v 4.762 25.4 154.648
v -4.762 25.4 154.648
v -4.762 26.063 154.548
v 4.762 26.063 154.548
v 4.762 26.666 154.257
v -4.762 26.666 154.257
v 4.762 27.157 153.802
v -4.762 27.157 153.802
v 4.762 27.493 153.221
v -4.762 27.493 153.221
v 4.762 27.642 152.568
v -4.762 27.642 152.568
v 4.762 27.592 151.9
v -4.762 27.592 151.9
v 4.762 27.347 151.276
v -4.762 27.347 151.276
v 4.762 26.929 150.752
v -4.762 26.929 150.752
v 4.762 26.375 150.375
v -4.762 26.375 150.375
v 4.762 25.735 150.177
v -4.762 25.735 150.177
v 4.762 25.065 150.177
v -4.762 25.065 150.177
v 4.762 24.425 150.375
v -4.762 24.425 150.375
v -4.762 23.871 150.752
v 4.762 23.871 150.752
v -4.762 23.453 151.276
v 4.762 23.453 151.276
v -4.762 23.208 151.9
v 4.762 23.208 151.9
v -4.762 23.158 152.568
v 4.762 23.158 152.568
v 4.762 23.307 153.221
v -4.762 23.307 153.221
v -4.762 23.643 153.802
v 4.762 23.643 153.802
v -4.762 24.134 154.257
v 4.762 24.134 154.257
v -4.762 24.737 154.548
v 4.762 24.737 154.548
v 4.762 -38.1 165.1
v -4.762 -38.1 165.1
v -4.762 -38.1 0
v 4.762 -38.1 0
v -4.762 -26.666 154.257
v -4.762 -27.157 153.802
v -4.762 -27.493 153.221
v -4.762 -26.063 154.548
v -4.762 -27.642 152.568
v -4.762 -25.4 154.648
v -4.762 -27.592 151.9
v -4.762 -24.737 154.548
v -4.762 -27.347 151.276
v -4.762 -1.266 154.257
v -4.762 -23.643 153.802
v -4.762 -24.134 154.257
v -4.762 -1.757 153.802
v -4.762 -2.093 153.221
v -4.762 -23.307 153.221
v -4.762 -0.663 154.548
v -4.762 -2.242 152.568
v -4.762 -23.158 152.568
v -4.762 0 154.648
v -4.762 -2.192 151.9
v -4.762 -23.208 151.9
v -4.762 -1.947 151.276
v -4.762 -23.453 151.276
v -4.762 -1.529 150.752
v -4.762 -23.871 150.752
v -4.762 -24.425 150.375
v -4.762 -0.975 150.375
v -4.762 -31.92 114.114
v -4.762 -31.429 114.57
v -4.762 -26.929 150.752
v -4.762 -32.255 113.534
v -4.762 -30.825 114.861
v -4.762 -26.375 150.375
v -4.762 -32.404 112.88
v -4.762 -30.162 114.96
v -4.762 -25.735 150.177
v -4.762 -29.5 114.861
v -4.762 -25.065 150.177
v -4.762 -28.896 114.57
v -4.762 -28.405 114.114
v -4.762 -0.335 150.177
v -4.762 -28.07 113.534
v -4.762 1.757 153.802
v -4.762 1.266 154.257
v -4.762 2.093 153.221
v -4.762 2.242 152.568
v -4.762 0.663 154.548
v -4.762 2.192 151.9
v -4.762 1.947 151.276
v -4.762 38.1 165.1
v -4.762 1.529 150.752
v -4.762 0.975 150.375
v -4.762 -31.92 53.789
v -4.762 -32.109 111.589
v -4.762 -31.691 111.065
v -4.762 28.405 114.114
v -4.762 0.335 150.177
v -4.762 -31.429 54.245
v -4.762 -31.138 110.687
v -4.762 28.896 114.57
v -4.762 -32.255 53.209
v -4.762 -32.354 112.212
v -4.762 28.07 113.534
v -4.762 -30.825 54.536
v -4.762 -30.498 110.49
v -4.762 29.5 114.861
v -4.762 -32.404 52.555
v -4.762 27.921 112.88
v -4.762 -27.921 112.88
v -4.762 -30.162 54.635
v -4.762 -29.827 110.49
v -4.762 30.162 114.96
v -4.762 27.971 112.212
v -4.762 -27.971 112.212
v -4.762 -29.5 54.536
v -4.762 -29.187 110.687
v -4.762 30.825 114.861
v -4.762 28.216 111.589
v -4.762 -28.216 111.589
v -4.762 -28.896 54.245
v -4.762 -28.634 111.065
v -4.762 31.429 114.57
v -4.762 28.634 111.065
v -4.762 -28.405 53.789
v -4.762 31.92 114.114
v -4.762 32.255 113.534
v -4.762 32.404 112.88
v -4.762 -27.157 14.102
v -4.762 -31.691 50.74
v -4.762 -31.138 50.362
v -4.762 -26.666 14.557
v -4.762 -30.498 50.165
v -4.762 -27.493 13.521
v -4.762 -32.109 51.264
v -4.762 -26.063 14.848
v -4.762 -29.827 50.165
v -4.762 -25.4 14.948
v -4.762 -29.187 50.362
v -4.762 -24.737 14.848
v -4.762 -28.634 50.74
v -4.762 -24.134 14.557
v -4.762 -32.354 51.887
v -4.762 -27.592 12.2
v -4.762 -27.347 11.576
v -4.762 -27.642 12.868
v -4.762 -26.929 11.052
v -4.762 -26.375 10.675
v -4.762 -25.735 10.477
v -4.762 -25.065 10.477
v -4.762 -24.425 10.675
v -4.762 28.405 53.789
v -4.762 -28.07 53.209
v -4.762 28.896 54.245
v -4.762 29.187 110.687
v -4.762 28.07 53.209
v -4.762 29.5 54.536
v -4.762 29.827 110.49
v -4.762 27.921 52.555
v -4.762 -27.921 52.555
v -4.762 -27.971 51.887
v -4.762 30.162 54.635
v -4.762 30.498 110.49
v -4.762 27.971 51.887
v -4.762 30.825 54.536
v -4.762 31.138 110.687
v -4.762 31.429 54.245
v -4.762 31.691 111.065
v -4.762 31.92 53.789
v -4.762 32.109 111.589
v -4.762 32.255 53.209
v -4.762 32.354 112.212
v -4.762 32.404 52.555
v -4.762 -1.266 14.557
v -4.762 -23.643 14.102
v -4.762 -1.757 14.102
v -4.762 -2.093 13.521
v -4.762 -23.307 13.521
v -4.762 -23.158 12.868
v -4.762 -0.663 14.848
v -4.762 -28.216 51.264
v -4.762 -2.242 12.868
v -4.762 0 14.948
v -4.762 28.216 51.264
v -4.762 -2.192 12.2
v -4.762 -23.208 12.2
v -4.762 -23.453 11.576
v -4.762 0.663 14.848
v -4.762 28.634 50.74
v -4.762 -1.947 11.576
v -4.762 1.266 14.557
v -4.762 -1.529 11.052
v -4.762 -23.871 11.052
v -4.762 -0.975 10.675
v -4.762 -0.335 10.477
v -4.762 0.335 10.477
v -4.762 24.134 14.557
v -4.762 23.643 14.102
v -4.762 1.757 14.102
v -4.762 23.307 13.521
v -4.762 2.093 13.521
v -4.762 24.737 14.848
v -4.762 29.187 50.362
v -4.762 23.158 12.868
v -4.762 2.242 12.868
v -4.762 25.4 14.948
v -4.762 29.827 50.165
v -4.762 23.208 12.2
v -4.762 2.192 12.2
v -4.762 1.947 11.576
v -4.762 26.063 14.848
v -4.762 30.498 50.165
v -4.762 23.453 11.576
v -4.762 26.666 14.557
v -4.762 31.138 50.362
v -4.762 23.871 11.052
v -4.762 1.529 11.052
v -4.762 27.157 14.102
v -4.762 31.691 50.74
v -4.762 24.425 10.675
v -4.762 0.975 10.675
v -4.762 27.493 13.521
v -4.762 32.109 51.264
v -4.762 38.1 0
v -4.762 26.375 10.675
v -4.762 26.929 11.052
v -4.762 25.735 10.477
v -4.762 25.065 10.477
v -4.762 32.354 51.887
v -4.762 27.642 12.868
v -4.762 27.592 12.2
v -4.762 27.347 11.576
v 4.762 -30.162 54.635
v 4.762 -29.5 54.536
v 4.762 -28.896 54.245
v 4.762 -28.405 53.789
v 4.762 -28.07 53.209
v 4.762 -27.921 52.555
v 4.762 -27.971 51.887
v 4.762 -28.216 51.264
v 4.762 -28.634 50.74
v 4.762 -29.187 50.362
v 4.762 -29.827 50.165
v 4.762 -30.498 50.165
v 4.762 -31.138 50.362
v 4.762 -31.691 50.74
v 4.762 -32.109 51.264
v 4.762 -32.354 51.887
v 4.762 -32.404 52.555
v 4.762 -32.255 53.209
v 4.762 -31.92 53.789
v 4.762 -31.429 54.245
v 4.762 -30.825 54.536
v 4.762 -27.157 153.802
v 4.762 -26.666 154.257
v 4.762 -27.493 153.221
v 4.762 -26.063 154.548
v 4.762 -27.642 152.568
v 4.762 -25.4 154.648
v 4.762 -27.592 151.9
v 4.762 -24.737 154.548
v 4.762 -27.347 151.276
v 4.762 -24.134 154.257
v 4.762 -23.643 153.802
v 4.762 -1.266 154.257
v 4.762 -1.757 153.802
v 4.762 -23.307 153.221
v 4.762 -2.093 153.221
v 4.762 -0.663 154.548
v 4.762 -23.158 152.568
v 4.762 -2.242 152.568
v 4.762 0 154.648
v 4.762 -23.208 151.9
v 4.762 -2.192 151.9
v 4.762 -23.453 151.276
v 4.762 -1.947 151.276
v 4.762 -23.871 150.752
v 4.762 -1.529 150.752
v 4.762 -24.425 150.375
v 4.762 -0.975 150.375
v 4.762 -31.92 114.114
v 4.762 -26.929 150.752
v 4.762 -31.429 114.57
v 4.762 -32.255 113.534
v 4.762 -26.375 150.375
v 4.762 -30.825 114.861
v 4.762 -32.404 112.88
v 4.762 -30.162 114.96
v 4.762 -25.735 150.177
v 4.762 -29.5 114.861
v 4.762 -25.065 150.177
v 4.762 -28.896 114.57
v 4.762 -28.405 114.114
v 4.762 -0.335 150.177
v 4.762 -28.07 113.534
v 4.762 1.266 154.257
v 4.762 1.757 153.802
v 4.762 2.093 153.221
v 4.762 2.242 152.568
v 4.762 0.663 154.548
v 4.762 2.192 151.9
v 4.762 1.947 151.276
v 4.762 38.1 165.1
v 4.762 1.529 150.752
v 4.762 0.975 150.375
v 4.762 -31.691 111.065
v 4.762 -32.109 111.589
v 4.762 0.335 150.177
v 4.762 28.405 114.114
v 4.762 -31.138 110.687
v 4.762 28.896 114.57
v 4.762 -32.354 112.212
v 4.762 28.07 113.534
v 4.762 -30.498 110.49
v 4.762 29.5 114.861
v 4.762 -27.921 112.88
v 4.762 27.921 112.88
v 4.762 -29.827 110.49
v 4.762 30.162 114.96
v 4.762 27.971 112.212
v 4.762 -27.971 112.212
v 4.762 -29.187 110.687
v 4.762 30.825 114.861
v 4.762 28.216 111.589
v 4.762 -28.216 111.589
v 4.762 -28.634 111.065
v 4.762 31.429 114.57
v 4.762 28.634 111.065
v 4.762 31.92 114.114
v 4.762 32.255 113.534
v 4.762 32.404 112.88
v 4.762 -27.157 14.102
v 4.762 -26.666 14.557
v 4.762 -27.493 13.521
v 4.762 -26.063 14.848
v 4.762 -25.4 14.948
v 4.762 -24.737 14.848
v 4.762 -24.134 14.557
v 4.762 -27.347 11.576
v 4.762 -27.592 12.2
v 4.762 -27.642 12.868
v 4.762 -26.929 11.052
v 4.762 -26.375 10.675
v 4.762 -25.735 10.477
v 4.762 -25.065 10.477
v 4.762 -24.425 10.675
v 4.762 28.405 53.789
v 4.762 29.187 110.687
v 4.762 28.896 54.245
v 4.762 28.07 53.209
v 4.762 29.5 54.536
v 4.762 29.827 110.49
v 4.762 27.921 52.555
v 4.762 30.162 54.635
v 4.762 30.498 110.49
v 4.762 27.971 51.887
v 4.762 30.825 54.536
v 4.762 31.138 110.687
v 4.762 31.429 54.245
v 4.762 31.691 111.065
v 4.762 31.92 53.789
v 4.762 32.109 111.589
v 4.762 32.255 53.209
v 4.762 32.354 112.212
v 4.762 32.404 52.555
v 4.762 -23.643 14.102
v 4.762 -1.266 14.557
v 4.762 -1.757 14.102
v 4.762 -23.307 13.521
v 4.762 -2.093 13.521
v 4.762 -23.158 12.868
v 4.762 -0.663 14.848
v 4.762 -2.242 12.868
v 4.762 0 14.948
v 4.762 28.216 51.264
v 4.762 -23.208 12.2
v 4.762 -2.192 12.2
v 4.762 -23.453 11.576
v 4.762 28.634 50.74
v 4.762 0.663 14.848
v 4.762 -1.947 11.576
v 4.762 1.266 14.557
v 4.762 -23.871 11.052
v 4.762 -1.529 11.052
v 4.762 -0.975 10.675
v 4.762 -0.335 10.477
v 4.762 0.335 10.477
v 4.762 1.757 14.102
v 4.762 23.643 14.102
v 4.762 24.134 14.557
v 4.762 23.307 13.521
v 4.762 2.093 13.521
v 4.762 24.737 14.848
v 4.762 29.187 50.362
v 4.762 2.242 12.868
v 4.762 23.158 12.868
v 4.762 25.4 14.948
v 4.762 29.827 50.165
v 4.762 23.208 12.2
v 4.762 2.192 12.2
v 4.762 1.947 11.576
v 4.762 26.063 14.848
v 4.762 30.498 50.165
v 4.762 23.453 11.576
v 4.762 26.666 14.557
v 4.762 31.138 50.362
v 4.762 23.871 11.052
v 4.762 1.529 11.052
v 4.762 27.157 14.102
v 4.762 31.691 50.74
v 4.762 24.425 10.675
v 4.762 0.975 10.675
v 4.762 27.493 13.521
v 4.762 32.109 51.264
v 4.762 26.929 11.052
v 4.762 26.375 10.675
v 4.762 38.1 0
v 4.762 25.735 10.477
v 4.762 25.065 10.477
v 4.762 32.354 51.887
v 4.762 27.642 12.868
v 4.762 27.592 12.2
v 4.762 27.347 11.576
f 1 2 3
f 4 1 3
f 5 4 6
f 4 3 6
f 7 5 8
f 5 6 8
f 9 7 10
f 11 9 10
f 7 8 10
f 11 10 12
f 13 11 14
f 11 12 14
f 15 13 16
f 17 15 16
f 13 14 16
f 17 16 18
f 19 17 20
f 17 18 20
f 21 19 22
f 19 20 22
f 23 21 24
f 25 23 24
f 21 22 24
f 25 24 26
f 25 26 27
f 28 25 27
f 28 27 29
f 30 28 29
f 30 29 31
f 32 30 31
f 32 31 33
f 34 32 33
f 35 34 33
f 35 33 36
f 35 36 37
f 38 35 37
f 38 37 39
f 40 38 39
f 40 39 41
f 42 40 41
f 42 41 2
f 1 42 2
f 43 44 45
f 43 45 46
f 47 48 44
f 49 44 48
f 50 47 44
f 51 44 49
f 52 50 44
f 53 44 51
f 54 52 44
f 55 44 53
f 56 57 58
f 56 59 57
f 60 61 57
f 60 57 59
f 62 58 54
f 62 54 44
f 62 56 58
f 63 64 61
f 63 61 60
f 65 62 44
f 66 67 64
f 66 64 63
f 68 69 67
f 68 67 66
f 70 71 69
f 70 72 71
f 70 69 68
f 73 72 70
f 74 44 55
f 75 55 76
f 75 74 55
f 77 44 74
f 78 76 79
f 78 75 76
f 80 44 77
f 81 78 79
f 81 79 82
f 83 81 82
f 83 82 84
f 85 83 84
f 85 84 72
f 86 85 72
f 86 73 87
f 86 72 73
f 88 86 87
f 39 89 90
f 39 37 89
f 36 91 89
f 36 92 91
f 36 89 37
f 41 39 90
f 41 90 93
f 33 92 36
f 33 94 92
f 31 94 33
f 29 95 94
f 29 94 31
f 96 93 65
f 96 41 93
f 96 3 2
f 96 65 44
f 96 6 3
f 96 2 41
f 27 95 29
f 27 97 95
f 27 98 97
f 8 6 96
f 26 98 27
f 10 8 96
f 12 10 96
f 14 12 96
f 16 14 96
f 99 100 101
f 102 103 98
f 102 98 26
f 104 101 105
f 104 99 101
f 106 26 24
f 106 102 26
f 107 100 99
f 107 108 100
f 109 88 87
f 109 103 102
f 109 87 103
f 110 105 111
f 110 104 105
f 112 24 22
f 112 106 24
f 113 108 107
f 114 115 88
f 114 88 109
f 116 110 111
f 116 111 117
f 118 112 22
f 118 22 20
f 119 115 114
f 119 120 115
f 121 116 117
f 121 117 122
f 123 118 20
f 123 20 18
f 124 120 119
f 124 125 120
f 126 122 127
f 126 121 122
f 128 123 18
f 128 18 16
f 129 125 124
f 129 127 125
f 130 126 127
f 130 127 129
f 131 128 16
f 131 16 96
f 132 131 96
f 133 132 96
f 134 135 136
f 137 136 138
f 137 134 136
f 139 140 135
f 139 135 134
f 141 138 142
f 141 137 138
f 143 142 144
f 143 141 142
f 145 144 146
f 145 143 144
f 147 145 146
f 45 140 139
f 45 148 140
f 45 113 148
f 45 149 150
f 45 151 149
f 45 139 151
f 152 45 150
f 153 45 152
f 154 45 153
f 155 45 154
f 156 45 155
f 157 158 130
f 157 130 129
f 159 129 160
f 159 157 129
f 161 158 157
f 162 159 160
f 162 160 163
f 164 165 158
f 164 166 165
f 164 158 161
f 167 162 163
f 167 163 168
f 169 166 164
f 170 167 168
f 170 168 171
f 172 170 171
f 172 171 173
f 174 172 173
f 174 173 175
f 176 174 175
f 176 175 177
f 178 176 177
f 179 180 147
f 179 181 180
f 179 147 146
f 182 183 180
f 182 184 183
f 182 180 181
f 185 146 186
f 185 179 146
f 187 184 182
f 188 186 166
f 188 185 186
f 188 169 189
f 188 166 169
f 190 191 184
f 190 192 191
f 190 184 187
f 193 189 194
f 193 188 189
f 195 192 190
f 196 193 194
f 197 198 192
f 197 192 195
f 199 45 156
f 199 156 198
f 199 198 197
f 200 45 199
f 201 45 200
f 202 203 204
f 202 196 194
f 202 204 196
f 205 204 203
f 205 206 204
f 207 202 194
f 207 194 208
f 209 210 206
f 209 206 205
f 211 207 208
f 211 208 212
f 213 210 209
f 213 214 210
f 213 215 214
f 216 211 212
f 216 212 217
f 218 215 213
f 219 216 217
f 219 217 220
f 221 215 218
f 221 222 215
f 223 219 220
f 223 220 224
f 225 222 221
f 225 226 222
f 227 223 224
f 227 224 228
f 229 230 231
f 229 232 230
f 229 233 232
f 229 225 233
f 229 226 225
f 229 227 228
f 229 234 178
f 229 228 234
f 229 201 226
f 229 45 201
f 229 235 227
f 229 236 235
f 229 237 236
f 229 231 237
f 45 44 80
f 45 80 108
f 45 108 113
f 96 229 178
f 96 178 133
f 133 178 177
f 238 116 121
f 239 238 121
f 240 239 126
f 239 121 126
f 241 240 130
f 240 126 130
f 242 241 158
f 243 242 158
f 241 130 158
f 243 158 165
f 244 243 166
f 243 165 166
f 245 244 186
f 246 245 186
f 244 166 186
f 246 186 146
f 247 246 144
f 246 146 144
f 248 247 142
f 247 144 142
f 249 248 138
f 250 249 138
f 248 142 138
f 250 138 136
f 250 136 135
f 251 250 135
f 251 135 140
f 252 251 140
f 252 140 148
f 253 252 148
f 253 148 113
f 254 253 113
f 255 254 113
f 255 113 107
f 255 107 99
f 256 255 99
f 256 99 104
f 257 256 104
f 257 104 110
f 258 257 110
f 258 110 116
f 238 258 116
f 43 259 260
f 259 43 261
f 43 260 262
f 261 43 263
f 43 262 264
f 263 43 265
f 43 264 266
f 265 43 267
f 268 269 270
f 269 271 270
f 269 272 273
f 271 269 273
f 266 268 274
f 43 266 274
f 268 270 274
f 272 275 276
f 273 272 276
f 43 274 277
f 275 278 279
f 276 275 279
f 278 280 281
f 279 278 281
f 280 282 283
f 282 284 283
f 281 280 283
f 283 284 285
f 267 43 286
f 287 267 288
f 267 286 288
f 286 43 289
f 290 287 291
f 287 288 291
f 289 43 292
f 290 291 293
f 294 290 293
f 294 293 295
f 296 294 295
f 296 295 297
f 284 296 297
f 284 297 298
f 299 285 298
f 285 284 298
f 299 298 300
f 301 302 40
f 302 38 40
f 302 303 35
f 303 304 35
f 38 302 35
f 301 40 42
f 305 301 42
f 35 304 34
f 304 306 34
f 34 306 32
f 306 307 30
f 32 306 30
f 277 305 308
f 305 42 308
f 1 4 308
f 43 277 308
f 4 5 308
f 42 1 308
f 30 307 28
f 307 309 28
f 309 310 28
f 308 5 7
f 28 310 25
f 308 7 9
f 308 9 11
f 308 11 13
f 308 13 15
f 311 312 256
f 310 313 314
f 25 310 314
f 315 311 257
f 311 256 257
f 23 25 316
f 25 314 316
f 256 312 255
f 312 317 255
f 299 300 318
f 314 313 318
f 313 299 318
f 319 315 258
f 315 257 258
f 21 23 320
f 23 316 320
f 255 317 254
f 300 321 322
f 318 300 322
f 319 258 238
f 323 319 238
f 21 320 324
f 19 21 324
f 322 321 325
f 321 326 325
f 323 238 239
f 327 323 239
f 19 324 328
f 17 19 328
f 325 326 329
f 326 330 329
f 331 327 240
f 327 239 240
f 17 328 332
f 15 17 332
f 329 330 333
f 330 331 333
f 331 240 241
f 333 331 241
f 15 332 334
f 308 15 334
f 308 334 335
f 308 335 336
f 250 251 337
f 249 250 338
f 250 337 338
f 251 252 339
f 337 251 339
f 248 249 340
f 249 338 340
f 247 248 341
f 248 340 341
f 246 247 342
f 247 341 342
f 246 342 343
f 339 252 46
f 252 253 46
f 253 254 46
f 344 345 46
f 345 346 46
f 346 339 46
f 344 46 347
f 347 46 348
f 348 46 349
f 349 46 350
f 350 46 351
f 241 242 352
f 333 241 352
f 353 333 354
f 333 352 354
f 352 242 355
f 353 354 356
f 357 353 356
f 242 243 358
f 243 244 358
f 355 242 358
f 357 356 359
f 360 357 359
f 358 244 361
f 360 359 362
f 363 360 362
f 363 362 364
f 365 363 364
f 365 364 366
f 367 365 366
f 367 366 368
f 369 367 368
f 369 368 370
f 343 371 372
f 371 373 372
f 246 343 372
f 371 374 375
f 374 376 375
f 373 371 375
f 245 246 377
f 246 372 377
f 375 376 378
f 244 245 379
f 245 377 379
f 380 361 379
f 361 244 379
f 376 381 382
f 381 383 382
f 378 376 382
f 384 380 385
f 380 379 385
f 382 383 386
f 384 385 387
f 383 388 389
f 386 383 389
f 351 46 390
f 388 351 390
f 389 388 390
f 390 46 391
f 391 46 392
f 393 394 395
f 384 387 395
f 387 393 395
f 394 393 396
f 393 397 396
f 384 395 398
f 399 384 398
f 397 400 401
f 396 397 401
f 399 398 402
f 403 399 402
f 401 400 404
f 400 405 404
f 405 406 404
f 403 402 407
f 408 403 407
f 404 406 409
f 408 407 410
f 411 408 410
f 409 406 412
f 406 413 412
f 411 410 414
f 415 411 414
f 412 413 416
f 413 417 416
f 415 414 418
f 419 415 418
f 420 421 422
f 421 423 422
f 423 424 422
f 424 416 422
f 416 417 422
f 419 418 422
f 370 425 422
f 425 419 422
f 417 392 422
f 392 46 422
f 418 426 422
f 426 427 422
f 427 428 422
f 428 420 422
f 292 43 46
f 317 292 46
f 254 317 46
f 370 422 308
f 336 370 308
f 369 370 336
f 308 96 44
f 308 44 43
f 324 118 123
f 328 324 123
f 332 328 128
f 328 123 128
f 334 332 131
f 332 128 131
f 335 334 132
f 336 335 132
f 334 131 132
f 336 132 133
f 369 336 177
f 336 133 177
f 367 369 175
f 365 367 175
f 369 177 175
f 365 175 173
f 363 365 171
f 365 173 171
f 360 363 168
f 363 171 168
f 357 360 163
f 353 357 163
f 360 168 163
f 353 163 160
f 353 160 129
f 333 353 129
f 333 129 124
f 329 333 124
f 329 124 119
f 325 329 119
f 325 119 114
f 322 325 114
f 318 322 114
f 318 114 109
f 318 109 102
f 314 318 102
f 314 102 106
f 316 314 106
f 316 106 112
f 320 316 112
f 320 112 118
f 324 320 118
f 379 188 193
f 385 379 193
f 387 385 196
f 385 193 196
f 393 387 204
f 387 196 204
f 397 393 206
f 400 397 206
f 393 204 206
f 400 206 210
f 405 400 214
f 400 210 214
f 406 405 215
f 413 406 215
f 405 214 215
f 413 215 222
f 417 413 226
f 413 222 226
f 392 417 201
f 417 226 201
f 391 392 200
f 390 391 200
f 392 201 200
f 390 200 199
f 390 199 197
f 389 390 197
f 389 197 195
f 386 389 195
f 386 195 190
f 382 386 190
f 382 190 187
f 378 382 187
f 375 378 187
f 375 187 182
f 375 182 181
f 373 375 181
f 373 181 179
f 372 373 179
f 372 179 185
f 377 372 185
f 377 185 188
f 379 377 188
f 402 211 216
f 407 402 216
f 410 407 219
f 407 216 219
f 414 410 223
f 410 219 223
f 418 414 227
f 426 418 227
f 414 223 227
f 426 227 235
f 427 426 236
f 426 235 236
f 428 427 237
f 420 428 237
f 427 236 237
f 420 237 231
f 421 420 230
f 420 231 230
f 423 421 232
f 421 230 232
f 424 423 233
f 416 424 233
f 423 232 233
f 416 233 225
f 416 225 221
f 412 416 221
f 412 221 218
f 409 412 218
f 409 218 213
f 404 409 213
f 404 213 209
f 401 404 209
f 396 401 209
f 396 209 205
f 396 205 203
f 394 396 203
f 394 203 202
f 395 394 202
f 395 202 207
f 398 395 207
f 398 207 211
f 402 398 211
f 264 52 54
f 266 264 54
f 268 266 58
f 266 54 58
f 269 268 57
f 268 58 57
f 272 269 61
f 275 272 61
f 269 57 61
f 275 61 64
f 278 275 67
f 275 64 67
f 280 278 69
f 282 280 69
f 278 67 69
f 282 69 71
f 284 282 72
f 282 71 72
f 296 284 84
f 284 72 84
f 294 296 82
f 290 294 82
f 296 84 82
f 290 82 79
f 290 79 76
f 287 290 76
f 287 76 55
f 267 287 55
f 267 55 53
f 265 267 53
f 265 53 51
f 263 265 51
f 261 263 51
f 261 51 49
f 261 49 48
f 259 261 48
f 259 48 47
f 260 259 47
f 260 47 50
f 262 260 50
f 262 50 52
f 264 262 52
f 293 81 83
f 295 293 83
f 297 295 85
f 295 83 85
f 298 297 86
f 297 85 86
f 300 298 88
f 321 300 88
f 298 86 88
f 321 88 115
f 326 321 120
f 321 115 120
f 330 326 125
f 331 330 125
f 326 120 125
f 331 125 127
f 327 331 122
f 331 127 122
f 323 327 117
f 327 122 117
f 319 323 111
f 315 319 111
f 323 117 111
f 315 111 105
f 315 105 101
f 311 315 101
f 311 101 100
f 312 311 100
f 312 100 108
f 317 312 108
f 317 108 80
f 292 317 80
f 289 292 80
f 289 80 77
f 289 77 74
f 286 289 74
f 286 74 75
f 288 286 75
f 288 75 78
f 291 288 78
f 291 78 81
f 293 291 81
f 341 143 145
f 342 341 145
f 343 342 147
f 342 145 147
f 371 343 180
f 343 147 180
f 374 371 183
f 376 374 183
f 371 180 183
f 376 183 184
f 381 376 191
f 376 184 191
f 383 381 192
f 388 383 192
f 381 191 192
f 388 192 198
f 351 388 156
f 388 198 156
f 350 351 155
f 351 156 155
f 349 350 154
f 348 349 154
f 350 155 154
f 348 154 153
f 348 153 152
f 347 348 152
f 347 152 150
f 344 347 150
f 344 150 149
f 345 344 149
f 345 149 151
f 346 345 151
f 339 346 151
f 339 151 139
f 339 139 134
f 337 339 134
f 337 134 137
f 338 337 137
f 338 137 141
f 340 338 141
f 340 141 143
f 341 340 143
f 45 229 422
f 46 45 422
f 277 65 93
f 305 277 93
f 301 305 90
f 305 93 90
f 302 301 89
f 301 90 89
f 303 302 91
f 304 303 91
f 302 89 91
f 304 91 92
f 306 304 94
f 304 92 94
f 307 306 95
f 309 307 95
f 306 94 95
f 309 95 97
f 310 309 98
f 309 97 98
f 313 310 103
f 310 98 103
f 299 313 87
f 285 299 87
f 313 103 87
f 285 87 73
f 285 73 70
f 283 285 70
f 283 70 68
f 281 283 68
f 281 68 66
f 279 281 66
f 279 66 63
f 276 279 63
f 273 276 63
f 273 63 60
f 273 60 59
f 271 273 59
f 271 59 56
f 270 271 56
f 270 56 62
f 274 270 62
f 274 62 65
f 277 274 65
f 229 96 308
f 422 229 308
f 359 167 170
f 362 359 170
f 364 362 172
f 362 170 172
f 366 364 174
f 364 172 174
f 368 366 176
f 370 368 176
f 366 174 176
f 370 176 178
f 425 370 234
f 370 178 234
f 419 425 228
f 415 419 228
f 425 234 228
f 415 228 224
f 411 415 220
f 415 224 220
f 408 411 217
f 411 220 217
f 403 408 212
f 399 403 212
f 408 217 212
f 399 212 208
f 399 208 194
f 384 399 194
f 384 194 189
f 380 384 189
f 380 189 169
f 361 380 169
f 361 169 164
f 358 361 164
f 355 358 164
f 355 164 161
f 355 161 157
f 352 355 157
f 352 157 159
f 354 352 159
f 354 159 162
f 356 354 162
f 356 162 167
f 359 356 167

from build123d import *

# Parameters (mm, degrees)
SKETCH1_W             = 9.525
SKETCH1_H             = 76.2
BOSS_EXTRUDE1_DEPTH   = 165.1
F_8_CLEARANCE_HOLE1_D = 4.4958
F_8_CLEARANCE_HOLE2_D = 4.4958


with BuildPart() as part:
    # Sketch1 → Boss-Extrude1 (new body)
    with BuildSketch(Plane.XY):
        Rectangle(SKETCH1_W, SKETCH1_H)
    extrude(amount=BOSS_EXTRUDE1_DEPTH)

    # #8 Clearance Hole1 (through all)
    with Locations(Plane(origin=(4.7625, 0, 0), x_dir=(0, 0, -1), z_dir=(1, 0, 0))):
        with Locations((-52.3875, -30.1625), (-112.7125, 30.1625), (-112.7125, -30.1625), (-52.3875, 30.1625)):
            Hole(F_8_CLEARANCE_HOLE1_D / 2)

    # #8 Clearance Hole2 (through all)
    with Locations(Plane(origin=(4.7625, 0, 0), x_dir=(0, 0, -1), z_dir=(1, 0, 0))):
        with Locations((-152.4, 25.4), (-152.4, 0), (-152.4, -25.4), (-12.7, 25.4), (-12.7, 0), (-12.7, -25.4)):
            Hole(F_8_CLEARANCE_HOLE2_D / 2)


solid = part.part
